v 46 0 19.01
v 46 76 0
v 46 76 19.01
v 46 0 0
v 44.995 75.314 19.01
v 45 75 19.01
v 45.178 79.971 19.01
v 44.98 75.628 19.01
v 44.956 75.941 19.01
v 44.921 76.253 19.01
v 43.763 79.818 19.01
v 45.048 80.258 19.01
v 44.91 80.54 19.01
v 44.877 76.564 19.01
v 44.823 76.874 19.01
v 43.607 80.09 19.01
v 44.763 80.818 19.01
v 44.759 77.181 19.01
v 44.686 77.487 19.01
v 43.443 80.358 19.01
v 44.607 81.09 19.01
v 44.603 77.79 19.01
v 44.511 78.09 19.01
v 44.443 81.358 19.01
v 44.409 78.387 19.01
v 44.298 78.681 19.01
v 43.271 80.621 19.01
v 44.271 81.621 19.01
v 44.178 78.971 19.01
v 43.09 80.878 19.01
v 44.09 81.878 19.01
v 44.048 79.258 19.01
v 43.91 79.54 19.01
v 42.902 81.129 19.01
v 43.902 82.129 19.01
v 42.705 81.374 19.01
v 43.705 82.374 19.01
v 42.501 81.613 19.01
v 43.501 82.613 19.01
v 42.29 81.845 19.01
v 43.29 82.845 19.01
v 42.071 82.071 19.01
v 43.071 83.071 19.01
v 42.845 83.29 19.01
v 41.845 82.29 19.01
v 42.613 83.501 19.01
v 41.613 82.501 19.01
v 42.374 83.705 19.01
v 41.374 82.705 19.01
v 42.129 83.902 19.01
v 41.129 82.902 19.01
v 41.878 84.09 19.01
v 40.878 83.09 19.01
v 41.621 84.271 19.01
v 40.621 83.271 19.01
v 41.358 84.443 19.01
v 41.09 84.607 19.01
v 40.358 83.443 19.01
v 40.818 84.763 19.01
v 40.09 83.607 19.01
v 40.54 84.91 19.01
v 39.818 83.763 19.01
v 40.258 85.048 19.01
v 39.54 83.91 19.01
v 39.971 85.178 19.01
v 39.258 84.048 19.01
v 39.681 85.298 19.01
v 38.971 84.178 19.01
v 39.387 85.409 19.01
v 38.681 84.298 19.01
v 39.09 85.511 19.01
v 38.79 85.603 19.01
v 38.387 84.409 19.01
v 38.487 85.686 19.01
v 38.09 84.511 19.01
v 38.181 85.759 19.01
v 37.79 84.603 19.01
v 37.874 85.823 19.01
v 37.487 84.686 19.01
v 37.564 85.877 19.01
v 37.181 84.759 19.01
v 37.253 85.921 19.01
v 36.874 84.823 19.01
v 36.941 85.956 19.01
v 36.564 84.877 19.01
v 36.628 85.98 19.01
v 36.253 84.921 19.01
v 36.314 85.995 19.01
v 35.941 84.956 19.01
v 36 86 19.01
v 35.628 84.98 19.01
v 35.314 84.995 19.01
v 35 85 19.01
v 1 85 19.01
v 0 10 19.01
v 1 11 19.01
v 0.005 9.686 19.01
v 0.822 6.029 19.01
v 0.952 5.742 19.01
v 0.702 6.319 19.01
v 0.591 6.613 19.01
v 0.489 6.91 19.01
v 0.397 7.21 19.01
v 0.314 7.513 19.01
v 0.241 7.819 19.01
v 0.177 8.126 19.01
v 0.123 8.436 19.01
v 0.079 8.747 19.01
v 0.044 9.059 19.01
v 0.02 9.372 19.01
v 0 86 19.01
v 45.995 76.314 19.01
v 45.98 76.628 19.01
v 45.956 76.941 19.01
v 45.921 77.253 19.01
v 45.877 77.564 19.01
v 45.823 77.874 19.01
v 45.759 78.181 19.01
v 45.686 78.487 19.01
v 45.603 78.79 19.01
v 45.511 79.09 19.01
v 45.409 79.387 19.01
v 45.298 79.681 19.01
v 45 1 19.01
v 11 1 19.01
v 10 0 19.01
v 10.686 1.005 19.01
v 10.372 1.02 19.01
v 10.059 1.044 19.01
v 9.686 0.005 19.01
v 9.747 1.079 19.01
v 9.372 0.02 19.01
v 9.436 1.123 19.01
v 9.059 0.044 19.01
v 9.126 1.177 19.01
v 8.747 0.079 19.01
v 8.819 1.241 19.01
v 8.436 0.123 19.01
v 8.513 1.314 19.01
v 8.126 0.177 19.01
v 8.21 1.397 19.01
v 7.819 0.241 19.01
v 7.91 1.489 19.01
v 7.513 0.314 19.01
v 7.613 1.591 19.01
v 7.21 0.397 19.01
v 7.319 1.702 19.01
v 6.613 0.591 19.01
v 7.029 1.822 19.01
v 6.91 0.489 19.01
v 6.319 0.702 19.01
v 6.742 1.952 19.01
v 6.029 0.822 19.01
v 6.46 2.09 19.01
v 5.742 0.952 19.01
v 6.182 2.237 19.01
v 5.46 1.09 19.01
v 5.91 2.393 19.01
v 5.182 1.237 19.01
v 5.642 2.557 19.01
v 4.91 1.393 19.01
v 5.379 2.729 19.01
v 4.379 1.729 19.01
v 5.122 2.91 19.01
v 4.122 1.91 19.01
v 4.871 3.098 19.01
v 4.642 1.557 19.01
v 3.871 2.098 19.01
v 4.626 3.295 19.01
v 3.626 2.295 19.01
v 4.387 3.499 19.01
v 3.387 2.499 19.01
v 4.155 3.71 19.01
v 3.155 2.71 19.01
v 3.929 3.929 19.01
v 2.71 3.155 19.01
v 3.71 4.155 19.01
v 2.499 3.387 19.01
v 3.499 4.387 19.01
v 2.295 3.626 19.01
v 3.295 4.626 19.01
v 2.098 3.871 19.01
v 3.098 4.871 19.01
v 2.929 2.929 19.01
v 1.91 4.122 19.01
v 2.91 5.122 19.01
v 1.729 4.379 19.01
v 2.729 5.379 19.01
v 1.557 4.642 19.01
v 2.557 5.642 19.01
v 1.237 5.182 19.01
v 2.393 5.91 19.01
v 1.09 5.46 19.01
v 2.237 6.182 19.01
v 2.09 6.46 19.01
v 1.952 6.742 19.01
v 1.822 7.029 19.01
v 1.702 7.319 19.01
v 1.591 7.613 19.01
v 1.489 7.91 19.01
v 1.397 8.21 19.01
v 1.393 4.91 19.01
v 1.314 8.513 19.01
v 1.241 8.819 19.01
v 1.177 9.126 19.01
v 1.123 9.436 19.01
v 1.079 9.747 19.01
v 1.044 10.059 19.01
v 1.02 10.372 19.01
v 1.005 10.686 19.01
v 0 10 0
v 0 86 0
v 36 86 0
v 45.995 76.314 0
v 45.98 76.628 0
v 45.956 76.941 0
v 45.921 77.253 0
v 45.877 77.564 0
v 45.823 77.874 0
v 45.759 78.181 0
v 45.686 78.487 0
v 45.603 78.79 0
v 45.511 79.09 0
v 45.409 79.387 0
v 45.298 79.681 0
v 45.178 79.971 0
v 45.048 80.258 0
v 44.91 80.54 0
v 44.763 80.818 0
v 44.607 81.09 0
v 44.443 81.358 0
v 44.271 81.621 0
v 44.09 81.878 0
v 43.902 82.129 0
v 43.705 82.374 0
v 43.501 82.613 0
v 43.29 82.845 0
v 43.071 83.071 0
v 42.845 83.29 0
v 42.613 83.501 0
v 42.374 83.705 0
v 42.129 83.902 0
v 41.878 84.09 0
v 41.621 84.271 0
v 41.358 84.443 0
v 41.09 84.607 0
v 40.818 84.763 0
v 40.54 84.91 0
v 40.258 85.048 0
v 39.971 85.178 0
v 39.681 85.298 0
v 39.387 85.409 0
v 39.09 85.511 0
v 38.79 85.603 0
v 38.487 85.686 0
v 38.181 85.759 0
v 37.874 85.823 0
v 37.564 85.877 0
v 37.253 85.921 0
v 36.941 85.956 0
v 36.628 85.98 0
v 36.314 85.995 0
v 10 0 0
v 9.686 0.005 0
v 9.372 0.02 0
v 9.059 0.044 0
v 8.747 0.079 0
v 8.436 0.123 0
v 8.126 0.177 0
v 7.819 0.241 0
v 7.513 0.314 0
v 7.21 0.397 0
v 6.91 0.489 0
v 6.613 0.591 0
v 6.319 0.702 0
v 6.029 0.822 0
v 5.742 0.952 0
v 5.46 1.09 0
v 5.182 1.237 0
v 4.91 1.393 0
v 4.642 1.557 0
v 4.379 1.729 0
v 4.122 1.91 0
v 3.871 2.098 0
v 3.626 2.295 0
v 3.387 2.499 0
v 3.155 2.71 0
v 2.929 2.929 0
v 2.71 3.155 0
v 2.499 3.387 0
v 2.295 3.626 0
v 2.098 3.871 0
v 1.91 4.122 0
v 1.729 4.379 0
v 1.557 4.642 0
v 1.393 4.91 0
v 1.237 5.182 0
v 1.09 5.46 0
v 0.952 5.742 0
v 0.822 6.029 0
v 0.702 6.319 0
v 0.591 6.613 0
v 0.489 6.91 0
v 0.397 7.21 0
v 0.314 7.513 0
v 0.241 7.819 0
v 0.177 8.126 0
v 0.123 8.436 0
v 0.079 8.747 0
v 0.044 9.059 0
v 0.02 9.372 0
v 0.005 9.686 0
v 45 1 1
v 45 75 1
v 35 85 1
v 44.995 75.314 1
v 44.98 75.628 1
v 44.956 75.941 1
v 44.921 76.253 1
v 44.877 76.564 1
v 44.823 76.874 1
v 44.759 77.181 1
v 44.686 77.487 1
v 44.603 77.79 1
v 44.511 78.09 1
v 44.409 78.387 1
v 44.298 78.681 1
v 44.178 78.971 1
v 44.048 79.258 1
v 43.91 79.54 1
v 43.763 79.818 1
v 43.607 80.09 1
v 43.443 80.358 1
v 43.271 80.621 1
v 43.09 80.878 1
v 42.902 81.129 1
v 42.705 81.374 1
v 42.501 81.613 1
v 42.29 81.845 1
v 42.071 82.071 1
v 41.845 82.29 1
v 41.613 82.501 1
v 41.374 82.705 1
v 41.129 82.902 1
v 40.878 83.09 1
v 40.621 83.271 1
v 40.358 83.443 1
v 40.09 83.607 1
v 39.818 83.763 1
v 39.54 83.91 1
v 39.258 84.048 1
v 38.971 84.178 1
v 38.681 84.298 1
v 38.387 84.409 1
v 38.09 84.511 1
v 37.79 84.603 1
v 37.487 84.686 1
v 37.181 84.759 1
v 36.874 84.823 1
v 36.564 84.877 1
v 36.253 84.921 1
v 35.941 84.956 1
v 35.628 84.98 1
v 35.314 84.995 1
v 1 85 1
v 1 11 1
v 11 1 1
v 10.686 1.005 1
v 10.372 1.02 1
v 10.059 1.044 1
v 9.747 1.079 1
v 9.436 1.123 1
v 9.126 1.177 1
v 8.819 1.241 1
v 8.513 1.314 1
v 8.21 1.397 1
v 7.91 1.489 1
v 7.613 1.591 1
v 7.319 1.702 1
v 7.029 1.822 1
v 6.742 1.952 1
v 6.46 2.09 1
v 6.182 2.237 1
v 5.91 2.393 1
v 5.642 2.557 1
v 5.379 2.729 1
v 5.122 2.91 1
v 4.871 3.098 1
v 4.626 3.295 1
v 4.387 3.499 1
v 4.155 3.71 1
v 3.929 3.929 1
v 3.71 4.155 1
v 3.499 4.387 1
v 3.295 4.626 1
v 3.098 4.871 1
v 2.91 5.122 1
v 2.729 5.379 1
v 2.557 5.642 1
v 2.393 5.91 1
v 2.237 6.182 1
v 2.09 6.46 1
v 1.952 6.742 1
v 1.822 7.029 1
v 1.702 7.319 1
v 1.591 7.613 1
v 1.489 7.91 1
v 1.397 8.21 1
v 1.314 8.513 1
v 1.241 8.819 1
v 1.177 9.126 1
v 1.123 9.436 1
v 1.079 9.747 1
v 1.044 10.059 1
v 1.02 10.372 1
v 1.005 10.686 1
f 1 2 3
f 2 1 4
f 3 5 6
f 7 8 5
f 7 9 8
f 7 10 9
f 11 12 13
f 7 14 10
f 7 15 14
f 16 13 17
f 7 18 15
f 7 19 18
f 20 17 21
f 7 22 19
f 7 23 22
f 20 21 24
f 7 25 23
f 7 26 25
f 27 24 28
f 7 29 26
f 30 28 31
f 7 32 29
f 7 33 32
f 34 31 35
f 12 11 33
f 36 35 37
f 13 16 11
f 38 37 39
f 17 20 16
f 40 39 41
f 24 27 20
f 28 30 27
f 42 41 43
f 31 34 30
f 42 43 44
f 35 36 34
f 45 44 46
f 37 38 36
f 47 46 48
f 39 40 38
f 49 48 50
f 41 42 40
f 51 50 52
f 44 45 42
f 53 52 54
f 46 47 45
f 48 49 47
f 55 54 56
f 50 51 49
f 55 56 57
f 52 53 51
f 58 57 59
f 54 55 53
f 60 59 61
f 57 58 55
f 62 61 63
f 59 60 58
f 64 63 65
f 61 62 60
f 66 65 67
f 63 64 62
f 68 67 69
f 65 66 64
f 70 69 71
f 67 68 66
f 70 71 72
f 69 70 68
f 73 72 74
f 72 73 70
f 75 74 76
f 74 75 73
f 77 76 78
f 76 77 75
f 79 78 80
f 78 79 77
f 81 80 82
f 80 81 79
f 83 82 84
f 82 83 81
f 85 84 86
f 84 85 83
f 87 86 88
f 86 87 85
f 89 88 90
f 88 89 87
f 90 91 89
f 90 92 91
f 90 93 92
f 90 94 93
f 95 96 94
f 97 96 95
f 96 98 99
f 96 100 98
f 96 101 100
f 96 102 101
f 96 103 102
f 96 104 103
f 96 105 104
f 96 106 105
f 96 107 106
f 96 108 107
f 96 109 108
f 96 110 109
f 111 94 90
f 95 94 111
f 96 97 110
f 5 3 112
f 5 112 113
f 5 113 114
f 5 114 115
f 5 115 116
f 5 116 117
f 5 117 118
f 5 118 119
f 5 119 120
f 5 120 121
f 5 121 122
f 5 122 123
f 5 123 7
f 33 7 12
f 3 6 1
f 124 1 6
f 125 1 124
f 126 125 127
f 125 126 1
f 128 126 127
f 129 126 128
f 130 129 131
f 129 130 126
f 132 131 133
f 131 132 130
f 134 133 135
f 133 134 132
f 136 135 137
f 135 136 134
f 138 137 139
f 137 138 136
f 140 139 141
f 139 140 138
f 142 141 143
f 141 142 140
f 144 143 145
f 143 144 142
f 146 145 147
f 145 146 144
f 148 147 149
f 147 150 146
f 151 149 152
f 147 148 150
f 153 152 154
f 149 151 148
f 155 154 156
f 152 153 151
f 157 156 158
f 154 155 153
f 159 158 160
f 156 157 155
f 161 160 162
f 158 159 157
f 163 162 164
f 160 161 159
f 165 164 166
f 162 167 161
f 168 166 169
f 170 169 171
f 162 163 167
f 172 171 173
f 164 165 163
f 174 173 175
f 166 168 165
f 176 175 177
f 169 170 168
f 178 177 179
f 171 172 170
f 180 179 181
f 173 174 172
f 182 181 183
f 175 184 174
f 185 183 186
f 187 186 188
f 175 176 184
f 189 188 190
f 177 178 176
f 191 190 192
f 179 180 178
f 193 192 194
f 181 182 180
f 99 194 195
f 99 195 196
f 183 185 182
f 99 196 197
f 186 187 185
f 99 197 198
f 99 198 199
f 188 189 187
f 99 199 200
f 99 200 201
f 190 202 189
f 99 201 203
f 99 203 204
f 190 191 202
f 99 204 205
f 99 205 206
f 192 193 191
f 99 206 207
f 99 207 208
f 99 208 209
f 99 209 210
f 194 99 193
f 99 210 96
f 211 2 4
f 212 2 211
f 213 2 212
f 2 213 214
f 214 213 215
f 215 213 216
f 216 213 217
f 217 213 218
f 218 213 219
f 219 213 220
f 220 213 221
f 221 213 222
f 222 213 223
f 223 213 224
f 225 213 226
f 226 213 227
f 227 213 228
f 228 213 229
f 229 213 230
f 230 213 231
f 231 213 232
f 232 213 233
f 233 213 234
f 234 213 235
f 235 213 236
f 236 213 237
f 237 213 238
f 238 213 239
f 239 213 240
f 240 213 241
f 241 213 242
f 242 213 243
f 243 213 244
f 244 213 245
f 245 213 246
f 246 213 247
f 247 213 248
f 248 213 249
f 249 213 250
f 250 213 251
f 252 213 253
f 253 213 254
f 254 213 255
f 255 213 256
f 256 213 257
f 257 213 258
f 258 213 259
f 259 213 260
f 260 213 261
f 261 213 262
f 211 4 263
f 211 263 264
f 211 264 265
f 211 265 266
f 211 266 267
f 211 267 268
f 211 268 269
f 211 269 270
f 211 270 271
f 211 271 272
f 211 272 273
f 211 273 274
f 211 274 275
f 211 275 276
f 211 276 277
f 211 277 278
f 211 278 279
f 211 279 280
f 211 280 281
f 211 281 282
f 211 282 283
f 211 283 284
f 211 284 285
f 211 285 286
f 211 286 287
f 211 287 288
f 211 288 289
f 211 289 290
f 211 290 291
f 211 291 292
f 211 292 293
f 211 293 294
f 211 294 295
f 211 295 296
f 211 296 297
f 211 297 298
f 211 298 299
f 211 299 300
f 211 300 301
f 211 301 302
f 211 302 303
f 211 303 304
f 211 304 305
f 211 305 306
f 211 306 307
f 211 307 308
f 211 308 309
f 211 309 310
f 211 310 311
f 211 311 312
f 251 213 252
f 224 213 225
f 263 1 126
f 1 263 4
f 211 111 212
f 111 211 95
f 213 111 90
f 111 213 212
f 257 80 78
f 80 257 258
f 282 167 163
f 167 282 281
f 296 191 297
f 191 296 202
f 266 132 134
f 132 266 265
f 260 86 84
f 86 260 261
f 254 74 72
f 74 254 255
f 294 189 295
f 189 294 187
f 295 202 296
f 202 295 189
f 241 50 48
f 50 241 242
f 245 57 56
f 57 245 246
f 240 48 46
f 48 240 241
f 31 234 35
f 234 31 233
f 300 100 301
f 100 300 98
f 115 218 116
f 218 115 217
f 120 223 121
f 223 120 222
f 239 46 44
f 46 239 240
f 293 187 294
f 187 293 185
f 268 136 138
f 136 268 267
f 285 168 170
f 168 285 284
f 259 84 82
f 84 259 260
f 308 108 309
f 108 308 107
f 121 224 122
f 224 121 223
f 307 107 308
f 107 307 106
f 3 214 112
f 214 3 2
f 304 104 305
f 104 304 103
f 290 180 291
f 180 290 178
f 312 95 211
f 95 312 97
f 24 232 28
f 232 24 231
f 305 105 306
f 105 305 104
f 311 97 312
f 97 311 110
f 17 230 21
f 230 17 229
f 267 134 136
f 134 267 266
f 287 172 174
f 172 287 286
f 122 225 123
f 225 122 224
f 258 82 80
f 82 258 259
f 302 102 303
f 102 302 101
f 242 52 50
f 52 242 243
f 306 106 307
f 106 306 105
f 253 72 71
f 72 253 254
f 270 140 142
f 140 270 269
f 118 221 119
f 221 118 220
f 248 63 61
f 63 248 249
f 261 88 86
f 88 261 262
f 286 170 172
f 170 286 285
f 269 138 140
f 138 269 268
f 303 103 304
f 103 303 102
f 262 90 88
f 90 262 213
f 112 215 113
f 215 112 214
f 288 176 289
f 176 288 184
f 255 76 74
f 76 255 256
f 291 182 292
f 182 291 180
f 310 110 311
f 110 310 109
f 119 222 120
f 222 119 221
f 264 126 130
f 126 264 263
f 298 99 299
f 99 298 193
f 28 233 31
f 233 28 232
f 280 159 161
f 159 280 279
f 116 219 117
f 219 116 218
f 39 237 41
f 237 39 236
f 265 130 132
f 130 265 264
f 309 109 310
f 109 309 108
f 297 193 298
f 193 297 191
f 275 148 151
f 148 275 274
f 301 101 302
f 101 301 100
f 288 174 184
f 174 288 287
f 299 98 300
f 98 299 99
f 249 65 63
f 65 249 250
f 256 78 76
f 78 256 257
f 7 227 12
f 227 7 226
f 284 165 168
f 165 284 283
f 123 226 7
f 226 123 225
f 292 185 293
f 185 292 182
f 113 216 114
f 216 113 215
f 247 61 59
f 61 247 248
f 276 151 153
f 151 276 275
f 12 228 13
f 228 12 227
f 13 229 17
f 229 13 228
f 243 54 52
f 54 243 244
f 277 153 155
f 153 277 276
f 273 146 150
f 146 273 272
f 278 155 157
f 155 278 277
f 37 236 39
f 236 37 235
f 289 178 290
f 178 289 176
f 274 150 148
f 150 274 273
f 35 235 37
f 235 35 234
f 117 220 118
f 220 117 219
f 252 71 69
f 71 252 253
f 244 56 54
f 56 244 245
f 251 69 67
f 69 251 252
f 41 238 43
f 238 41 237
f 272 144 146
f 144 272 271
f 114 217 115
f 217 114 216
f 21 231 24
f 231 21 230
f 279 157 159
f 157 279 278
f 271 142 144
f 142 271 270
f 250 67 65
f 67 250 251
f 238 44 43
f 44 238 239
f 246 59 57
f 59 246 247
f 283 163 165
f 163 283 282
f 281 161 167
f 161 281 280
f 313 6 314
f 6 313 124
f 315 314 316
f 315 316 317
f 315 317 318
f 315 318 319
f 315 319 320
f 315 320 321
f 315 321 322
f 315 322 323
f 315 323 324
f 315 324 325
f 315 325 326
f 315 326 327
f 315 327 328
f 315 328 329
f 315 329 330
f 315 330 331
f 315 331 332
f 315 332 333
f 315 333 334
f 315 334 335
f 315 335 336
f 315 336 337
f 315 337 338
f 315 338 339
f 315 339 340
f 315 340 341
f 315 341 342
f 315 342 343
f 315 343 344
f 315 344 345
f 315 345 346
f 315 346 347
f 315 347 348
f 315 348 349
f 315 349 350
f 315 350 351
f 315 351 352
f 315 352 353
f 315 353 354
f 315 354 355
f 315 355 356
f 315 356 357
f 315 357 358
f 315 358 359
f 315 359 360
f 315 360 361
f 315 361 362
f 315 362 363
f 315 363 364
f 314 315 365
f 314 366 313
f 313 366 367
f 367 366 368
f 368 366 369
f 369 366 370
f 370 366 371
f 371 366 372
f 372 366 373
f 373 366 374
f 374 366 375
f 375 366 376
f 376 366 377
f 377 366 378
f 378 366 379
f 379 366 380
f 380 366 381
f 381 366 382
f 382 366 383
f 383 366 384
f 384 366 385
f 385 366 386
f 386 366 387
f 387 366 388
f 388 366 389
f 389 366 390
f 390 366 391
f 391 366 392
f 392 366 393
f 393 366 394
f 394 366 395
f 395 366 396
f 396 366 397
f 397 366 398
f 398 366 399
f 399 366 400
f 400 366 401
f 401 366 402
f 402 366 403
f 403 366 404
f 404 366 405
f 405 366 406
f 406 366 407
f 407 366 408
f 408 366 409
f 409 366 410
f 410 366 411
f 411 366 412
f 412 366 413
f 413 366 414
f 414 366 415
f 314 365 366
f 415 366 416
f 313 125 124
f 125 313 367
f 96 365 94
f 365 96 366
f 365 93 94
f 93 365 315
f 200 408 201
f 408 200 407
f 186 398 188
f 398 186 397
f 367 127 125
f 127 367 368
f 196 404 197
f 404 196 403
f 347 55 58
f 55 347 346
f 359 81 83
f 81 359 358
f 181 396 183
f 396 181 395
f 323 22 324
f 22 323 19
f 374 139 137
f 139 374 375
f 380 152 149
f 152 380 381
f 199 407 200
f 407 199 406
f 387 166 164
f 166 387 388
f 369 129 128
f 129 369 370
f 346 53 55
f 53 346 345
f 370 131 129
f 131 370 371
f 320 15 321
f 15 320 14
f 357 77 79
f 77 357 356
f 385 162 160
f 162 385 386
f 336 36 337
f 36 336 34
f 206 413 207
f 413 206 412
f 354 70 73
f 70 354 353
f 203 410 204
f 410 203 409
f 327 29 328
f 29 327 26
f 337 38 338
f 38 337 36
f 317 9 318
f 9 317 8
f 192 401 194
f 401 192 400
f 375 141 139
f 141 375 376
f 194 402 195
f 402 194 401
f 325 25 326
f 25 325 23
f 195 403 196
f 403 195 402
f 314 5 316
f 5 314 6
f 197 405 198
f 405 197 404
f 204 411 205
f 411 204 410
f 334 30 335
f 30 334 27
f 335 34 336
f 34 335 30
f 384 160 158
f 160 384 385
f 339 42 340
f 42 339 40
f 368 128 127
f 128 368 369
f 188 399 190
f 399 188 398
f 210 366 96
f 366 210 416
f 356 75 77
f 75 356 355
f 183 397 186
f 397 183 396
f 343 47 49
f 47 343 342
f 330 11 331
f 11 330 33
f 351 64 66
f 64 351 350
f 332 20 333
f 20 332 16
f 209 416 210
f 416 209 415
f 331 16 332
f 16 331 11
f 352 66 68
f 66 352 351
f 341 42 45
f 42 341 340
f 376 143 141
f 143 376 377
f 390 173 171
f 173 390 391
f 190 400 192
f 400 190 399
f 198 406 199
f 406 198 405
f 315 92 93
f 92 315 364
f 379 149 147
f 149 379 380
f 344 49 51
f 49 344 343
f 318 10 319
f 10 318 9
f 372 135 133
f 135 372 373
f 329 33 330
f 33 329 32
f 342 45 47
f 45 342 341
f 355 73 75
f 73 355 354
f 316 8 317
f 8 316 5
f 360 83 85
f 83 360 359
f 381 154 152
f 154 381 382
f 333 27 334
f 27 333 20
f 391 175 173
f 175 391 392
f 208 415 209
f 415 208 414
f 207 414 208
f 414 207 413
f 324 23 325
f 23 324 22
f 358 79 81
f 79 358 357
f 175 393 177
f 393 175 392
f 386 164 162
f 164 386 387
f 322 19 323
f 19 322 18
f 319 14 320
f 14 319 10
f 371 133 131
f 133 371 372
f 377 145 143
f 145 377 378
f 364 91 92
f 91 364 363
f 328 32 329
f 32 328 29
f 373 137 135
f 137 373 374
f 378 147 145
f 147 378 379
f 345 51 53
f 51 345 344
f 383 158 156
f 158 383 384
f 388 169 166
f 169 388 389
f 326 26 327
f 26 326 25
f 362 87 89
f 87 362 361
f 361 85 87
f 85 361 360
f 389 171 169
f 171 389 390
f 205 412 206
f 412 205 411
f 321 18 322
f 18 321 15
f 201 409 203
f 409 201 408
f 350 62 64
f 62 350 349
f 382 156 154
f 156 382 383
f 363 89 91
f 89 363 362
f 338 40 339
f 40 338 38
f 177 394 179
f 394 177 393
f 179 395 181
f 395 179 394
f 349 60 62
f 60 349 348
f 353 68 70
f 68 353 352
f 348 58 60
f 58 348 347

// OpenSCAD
$fn=200;

length = 86;
width= 46;
height = 19;
cornerRadius = 10;

translate([10, 10, 0]){
    difference() {
            roundedBox(length, width, height, cornerRadius); 
            translate([1,1,1]) {
                roundedBox(length-2, width-2, height-1, cornerRadius); 
            }
    }
}

module roundedBox(length, width, height, radius)
{
    dRadius = 2*radius;

    //cube bottom right
    translate([width-dRadius,-radius,0]) {
        cube(size=[radius,radius,height+0.01]);
    }

    //cube top left
    translate([-radius,length-dRadius,0]) {
        cube(size=[radius,radius,height+0.01]);
    }

    //base rounded shape
    minkowski() {
        cube(size=[width-dRadius,length-dRadius, height]);
        cylinder(r=radius, h=0.01);
    }
  
    
  
}
